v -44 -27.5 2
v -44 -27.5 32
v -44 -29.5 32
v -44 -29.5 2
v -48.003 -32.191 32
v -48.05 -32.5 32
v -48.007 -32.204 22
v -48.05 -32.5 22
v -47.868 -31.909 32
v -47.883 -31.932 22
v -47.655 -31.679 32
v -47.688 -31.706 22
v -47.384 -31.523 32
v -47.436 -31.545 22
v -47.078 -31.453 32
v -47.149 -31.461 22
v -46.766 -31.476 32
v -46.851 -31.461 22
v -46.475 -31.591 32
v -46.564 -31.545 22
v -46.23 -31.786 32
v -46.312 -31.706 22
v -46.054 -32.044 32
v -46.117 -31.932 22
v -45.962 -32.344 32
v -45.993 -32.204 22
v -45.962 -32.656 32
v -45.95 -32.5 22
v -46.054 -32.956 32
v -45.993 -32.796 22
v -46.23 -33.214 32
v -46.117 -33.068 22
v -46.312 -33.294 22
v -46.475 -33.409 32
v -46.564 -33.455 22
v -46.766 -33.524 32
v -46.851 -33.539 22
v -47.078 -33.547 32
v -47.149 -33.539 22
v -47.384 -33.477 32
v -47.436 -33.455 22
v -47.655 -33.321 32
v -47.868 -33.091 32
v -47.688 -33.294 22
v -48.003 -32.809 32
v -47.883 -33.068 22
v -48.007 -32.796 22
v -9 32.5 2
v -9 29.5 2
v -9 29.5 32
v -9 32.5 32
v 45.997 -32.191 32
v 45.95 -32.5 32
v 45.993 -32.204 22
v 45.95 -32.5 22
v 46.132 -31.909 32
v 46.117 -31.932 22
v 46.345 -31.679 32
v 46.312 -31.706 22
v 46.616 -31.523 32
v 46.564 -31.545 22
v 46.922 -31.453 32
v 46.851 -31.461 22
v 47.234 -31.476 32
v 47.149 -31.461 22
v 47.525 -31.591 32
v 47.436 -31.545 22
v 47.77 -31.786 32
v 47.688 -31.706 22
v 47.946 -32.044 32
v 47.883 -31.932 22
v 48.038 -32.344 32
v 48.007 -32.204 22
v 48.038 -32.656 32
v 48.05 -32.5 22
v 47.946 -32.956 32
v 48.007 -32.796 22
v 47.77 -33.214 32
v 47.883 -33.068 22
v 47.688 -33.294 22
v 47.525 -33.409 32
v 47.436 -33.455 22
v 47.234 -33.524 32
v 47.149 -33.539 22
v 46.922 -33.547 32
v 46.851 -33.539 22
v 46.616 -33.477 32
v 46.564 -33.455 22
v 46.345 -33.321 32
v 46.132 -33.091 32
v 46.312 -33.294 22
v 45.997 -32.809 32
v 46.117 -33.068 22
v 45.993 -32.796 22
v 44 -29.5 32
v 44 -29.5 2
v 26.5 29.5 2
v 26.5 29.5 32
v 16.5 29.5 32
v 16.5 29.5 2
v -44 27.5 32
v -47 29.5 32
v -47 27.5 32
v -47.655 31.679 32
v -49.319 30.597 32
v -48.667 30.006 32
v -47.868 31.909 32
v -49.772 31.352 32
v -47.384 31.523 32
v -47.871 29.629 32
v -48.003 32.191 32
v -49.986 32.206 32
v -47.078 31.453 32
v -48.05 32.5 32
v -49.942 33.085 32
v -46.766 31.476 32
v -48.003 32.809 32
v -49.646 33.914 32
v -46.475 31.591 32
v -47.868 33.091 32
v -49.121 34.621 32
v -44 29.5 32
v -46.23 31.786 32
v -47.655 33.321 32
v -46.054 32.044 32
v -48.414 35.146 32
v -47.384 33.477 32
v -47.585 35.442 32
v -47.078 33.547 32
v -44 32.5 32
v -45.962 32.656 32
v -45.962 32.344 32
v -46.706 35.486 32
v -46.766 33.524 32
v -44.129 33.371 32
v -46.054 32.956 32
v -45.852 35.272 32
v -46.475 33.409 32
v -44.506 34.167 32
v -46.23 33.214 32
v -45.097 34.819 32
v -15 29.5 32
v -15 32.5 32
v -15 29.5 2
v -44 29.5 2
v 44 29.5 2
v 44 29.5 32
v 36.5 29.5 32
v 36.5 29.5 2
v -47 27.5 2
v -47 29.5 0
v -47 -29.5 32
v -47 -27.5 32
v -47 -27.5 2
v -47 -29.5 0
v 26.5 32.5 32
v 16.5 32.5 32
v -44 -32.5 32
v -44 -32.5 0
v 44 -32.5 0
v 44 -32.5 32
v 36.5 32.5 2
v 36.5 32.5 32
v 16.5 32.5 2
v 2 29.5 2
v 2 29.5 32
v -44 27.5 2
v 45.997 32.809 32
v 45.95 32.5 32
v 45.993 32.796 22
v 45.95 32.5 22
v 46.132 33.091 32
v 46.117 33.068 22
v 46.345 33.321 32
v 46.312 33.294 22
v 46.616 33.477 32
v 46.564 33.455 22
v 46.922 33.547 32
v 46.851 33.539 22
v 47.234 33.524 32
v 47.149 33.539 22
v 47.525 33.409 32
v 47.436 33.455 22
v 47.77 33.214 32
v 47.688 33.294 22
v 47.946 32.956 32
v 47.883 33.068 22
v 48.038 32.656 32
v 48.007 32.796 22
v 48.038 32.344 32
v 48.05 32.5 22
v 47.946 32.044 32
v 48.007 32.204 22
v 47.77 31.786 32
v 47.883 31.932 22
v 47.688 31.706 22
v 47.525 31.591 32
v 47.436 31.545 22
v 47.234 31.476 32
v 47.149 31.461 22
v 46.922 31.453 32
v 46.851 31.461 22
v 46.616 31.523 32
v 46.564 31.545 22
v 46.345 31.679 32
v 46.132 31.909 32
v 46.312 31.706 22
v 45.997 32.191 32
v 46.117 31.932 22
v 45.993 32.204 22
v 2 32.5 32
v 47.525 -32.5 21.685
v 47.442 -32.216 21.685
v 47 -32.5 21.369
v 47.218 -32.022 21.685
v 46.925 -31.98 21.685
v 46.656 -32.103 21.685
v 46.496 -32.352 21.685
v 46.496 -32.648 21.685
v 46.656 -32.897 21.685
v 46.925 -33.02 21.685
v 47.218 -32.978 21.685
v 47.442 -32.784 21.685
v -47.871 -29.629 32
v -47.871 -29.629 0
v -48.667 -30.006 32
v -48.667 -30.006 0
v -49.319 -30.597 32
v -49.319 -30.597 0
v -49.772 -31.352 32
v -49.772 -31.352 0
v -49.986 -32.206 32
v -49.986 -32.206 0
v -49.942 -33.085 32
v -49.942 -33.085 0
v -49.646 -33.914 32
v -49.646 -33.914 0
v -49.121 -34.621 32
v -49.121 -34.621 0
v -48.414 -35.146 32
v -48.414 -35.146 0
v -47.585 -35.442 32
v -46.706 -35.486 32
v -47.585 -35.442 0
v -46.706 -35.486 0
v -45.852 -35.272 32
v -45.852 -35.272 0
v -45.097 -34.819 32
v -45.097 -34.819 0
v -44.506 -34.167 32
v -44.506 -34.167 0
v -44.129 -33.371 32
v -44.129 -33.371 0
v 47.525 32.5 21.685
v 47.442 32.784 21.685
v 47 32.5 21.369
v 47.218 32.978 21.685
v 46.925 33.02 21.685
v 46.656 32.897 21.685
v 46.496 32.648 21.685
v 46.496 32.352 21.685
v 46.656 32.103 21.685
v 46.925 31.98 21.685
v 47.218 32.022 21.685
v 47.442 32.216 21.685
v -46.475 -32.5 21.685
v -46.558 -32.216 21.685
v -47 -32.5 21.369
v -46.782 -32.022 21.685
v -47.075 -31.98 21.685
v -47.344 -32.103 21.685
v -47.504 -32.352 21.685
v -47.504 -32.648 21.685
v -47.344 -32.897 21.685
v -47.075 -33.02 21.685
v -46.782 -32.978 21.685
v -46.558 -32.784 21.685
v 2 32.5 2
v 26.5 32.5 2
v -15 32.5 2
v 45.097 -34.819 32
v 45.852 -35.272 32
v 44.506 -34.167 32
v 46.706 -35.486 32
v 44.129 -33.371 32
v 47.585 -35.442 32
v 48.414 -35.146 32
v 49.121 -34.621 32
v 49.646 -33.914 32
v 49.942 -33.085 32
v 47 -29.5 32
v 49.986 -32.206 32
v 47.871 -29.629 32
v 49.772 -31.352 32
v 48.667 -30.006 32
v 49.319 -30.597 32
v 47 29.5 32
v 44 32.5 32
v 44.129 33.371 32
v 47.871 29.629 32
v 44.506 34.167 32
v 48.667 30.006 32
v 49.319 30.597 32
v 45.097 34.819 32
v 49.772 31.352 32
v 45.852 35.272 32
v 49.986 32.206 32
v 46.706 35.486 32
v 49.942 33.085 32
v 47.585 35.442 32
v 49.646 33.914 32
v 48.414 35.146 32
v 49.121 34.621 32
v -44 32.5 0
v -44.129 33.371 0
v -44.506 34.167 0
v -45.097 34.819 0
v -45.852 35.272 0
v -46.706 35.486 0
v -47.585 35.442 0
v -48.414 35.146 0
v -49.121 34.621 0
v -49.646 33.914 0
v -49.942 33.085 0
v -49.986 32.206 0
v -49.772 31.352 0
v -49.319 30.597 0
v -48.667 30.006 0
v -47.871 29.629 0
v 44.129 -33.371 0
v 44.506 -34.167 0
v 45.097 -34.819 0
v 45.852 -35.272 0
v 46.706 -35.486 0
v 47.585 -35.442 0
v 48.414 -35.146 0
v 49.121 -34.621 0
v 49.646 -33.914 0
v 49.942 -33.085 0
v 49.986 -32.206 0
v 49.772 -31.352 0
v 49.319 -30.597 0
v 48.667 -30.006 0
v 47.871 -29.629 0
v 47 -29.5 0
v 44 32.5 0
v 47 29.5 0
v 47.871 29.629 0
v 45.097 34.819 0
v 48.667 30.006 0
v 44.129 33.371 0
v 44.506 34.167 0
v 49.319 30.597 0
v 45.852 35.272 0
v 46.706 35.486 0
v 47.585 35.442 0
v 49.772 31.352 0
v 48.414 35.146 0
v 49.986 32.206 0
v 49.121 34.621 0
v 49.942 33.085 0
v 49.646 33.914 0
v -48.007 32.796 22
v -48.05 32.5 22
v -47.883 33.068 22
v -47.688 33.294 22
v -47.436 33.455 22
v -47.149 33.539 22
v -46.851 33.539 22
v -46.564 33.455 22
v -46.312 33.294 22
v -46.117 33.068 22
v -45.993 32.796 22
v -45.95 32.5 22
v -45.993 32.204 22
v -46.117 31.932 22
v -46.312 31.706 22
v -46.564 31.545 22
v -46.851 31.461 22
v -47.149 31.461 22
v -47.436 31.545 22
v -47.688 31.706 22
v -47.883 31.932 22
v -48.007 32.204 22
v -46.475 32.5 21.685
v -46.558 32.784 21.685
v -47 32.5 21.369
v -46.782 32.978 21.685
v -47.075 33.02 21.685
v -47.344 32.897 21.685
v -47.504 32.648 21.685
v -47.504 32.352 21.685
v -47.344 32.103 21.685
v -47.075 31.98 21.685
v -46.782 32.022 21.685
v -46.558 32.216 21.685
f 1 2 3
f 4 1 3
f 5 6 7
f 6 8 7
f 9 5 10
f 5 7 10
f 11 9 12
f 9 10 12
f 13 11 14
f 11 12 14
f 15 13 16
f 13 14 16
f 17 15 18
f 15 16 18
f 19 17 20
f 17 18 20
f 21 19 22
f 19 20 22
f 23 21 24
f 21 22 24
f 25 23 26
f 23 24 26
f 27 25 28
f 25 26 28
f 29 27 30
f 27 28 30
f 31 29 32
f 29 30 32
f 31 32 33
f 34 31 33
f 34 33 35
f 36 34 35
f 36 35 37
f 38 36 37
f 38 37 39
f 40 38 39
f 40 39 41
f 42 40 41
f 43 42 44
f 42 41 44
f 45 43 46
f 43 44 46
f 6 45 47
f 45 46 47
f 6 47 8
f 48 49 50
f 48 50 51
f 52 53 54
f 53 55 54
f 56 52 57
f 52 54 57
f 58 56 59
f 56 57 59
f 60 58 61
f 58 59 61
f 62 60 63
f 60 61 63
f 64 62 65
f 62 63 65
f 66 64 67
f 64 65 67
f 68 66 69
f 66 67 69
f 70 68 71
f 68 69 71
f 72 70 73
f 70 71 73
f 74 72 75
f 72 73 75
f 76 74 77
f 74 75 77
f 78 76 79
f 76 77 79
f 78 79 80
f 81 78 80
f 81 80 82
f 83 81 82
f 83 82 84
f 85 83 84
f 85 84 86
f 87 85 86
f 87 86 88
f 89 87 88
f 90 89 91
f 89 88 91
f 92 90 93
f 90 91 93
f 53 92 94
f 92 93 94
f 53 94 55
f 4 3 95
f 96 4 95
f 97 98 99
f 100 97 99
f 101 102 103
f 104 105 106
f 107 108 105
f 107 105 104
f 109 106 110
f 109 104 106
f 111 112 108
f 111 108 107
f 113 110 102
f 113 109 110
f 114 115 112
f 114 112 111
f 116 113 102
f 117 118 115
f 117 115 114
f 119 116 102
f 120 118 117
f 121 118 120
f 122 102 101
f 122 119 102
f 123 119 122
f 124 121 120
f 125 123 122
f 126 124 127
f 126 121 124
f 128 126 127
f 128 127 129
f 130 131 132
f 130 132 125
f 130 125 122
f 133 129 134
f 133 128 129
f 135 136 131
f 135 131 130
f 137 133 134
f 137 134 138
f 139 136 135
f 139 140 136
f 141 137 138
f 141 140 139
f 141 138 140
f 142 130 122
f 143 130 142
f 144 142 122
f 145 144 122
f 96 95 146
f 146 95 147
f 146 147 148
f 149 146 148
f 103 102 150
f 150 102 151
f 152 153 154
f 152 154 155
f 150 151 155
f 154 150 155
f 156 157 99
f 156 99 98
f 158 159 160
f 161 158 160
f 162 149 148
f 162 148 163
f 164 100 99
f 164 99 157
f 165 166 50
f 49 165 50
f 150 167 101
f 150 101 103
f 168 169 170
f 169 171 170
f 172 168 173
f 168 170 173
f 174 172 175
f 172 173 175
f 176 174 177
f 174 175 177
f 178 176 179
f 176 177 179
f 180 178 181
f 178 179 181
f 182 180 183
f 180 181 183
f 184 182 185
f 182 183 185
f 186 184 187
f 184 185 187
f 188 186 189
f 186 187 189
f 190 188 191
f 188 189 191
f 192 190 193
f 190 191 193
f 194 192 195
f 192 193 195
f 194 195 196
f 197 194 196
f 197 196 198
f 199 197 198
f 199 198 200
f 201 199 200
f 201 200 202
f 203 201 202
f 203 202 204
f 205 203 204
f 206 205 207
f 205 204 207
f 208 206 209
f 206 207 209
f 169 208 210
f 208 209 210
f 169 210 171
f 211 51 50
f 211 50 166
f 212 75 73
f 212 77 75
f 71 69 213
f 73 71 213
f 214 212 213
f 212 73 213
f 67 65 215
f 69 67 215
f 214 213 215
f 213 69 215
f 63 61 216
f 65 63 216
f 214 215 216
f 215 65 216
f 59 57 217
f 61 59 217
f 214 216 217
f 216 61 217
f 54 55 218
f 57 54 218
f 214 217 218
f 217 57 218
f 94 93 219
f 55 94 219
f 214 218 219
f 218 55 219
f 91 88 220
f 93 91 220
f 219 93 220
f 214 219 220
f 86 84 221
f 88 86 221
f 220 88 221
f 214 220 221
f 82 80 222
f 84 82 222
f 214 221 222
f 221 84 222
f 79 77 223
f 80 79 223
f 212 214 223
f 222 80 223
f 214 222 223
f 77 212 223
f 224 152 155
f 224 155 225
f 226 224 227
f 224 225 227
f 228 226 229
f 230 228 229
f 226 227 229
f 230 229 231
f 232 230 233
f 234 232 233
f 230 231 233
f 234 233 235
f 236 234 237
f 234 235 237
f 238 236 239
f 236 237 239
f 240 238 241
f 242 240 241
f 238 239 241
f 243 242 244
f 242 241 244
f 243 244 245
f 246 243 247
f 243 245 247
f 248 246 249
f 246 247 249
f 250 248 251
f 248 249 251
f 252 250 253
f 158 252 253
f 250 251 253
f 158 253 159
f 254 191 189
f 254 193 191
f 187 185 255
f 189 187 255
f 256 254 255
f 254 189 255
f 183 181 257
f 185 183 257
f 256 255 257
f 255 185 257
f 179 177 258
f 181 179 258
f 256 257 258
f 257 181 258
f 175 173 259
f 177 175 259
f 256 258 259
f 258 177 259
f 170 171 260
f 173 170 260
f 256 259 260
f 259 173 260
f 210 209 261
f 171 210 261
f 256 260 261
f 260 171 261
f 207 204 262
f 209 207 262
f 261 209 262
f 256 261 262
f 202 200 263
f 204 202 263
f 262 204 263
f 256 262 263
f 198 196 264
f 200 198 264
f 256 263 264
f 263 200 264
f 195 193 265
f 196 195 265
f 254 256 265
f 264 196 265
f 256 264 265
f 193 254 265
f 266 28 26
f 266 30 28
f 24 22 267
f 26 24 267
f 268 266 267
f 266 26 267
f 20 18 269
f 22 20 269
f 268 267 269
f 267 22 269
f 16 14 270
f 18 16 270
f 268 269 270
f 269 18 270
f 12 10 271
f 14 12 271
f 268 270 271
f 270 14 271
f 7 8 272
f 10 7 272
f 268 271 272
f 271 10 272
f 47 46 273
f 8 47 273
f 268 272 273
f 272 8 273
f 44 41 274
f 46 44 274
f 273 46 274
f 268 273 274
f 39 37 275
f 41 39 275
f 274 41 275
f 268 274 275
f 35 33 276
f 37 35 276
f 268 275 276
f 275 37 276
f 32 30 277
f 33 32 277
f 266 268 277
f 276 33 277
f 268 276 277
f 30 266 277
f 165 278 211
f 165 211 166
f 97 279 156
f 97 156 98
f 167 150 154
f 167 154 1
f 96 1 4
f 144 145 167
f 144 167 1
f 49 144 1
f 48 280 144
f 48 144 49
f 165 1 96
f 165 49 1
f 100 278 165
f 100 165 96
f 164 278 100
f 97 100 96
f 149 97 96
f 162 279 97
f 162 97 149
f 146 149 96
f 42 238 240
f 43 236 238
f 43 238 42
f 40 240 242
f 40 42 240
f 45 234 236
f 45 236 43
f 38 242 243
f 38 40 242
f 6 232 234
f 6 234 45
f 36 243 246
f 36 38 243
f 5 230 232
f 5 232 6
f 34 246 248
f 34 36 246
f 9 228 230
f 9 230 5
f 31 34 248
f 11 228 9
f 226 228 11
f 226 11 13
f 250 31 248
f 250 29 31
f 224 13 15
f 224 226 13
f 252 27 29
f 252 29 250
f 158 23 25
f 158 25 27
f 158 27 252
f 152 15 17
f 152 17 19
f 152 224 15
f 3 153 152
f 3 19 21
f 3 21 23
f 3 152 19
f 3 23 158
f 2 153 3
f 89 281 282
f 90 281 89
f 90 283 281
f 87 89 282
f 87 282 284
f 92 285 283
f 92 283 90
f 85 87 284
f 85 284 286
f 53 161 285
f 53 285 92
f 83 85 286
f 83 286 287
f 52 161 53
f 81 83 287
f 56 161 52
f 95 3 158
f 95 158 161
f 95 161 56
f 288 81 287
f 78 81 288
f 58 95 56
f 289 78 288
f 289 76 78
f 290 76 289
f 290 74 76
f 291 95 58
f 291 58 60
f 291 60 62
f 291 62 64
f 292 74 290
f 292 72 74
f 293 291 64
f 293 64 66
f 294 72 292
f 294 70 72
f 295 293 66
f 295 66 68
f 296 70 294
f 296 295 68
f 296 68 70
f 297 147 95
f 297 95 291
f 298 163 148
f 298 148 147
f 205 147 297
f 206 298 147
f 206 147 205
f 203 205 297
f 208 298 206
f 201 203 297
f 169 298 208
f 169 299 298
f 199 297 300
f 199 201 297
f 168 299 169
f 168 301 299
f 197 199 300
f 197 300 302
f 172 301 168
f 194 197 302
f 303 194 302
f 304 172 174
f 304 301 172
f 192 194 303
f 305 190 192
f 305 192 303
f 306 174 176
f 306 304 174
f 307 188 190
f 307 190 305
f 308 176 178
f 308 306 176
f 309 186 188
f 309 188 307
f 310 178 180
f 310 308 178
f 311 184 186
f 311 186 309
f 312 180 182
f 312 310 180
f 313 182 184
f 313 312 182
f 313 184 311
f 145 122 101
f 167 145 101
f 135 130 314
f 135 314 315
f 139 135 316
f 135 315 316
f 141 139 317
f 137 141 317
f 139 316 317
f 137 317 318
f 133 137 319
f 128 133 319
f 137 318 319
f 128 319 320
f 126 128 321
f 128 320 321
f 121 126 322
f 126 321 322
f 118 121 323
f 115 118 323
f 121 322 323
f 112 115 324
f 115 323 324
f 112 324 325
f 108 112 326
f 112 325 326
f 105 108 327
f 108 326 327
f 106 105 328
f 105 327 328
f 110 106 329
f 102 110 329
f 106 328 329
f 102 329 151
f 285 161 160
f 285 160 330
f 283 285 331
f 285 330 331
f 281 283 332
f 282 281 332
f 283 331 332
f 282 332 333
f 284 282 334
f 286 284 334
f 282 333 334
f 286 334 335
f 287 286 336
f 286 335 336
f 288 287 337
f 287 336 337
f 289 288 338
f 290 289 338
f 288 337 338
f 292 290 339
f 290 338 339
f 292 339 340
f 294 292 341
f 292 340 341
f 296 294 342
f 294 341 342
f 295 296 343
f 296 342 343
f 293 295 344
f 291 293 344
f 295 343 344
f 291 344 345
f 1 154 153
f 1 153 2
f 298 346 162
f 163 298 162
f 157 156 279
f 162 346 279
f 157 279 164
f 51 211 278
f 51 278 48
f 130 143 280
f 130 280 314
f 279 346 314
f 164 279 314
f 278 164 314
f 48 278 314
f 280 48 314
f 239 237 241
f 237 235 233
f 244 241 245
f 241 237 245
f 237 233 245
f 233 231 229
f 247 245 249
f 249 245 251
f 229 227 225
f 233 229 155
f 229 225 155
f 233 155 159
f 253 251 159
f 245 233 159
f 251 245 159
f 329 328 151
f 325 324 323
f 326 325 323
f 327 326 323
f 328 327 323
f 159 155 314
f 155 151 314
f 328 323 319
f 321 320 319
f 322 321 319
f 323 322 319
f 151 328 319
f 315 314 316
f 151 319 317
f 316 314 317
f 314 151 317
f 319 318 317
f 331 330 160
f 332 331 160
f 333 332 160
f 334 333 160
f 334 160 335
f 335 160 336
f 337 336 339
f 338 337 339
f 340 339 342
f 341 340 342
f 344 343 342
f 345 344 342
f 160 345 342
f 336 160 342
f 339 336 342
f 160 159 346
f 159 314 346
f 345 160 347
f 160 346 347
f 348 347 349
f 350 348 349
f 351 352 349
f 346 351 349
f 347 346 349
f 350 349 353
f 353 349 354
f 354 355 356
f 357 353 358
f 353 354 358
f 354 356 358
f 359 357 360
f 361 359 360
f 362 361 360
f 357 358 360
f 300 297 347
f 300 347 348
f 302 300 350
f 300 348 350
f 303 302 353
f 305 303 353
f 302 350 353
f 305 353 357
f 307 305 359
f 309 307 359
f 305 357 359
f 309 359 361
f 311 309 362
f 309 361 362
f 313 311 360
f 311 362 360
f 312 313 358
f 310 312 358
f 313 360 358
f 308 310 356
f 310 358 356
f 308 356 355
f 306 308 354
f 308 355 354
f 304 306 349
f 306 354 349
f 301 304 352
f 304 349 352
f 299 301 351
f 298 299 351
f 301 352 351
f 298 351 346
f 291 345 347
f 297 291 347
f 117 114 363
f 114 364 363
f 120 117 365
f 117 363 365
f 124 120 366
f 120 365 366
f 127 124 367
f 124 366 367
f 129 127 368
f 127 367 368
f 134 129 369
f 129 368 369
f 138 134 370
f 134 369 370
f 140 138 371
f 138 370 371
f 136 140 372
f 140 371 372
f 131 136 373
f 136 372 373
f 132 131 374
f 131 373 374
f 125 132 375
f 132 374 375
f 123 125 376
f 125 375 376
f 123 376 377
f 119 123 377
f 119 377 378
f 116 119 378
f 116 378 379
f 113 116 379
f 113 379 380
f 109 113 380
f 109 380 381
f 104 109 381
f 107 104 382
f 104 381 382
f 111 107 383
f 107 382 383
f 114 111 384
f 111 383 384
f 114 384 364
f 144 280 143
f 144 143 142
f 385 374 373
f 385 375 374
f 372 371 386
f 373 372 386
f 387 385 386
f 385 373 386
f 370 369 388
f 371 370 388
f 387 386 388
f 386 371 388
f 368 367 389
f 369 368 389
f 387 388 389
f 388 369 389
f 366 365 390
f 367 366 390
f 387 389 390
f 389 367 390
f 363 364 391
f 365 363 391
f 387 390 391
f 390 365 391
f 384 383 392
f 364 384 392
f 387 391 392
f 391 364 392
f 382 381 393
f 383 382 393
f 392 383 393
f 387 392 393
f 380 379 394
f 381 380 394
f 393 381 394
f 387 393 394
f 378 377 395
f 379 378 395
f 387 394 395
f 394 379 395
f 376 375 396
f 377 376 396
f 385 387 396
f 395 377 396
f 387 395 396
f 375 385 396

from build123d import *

# Parameters (mm, degrees)
F1_DEPTH = 32
F3_DEPTH = 30
F5_D     = 2.1
F5_DEPTH = 10
F5_TIP   = 0.63090365


with BuildPart() as f1:
    # F0 (on Top) → F1 (new body)
    with BuildSketch(Plane.XY):
        with BuildLine():
            Line((-44, -32.5), (44, -32.5))
            ThreePointArc((44, -32.5), (49.1213203436, -34.6213203436), (47, -29.5))
            Line((47, -29.5), (47, 29.5))
            ThreePointArc((47, 29.5), (49.1213203436, 34.6213203436), (44, 32.5))
            Line((44, 32.5), (-44, 32.5))
            ThreePointArc((-44, 32.5), (-49.1213203436, 34.6213203436), (-47, 29.5))
            Line((-47, 29.5), (-47, -29.5))
            ThreePointArc((-47, -29.5), (-49.1213203436, -34.6213203436), (-44, -32.5))
        make_face()
    extrude(amount=F1_DEPTH)

    # F2 (on face) → F3 (cut)
    with BuildSketch(Plane.XY.offset(32)):
        Polygon((44, -29.5), (44, 29.5), (36.5, 29.5), (36.5, 32.5), (26.5, 32.5), (26.5, 29.5), (16.5, 29.5), (16.5, 32.5), (2, 32.5), (2, 29.5), (-9, 29.5), (-9, 32.5), (-15, 32.5), (-15, 29.5), (-44, 29.5), (-44, 27.5), (-47, 27.5), (-47, -27.5), (-44, -27.5), (-44, -29.5), align=None)
    extrude(amount=-F3_DEPTH, mode=Mode.SUBTRACT)

    # F5
    with Locations(Plane.XY.offset(32)):
        with Locations((-47, 32.5), (47, 32.5), (47, -32.5), (-47, -32.5)):
            Hole(F5_D / 2, depth=F5_DEPTH)
            with Locations((0, 0, -(F5_DEPTH + F5_TIP / 2))):  # 118° drill point
                Cone(0, F5_D / 2, F5_TIP, mode=Mode.SUBTRACT)


solid = f1.part
